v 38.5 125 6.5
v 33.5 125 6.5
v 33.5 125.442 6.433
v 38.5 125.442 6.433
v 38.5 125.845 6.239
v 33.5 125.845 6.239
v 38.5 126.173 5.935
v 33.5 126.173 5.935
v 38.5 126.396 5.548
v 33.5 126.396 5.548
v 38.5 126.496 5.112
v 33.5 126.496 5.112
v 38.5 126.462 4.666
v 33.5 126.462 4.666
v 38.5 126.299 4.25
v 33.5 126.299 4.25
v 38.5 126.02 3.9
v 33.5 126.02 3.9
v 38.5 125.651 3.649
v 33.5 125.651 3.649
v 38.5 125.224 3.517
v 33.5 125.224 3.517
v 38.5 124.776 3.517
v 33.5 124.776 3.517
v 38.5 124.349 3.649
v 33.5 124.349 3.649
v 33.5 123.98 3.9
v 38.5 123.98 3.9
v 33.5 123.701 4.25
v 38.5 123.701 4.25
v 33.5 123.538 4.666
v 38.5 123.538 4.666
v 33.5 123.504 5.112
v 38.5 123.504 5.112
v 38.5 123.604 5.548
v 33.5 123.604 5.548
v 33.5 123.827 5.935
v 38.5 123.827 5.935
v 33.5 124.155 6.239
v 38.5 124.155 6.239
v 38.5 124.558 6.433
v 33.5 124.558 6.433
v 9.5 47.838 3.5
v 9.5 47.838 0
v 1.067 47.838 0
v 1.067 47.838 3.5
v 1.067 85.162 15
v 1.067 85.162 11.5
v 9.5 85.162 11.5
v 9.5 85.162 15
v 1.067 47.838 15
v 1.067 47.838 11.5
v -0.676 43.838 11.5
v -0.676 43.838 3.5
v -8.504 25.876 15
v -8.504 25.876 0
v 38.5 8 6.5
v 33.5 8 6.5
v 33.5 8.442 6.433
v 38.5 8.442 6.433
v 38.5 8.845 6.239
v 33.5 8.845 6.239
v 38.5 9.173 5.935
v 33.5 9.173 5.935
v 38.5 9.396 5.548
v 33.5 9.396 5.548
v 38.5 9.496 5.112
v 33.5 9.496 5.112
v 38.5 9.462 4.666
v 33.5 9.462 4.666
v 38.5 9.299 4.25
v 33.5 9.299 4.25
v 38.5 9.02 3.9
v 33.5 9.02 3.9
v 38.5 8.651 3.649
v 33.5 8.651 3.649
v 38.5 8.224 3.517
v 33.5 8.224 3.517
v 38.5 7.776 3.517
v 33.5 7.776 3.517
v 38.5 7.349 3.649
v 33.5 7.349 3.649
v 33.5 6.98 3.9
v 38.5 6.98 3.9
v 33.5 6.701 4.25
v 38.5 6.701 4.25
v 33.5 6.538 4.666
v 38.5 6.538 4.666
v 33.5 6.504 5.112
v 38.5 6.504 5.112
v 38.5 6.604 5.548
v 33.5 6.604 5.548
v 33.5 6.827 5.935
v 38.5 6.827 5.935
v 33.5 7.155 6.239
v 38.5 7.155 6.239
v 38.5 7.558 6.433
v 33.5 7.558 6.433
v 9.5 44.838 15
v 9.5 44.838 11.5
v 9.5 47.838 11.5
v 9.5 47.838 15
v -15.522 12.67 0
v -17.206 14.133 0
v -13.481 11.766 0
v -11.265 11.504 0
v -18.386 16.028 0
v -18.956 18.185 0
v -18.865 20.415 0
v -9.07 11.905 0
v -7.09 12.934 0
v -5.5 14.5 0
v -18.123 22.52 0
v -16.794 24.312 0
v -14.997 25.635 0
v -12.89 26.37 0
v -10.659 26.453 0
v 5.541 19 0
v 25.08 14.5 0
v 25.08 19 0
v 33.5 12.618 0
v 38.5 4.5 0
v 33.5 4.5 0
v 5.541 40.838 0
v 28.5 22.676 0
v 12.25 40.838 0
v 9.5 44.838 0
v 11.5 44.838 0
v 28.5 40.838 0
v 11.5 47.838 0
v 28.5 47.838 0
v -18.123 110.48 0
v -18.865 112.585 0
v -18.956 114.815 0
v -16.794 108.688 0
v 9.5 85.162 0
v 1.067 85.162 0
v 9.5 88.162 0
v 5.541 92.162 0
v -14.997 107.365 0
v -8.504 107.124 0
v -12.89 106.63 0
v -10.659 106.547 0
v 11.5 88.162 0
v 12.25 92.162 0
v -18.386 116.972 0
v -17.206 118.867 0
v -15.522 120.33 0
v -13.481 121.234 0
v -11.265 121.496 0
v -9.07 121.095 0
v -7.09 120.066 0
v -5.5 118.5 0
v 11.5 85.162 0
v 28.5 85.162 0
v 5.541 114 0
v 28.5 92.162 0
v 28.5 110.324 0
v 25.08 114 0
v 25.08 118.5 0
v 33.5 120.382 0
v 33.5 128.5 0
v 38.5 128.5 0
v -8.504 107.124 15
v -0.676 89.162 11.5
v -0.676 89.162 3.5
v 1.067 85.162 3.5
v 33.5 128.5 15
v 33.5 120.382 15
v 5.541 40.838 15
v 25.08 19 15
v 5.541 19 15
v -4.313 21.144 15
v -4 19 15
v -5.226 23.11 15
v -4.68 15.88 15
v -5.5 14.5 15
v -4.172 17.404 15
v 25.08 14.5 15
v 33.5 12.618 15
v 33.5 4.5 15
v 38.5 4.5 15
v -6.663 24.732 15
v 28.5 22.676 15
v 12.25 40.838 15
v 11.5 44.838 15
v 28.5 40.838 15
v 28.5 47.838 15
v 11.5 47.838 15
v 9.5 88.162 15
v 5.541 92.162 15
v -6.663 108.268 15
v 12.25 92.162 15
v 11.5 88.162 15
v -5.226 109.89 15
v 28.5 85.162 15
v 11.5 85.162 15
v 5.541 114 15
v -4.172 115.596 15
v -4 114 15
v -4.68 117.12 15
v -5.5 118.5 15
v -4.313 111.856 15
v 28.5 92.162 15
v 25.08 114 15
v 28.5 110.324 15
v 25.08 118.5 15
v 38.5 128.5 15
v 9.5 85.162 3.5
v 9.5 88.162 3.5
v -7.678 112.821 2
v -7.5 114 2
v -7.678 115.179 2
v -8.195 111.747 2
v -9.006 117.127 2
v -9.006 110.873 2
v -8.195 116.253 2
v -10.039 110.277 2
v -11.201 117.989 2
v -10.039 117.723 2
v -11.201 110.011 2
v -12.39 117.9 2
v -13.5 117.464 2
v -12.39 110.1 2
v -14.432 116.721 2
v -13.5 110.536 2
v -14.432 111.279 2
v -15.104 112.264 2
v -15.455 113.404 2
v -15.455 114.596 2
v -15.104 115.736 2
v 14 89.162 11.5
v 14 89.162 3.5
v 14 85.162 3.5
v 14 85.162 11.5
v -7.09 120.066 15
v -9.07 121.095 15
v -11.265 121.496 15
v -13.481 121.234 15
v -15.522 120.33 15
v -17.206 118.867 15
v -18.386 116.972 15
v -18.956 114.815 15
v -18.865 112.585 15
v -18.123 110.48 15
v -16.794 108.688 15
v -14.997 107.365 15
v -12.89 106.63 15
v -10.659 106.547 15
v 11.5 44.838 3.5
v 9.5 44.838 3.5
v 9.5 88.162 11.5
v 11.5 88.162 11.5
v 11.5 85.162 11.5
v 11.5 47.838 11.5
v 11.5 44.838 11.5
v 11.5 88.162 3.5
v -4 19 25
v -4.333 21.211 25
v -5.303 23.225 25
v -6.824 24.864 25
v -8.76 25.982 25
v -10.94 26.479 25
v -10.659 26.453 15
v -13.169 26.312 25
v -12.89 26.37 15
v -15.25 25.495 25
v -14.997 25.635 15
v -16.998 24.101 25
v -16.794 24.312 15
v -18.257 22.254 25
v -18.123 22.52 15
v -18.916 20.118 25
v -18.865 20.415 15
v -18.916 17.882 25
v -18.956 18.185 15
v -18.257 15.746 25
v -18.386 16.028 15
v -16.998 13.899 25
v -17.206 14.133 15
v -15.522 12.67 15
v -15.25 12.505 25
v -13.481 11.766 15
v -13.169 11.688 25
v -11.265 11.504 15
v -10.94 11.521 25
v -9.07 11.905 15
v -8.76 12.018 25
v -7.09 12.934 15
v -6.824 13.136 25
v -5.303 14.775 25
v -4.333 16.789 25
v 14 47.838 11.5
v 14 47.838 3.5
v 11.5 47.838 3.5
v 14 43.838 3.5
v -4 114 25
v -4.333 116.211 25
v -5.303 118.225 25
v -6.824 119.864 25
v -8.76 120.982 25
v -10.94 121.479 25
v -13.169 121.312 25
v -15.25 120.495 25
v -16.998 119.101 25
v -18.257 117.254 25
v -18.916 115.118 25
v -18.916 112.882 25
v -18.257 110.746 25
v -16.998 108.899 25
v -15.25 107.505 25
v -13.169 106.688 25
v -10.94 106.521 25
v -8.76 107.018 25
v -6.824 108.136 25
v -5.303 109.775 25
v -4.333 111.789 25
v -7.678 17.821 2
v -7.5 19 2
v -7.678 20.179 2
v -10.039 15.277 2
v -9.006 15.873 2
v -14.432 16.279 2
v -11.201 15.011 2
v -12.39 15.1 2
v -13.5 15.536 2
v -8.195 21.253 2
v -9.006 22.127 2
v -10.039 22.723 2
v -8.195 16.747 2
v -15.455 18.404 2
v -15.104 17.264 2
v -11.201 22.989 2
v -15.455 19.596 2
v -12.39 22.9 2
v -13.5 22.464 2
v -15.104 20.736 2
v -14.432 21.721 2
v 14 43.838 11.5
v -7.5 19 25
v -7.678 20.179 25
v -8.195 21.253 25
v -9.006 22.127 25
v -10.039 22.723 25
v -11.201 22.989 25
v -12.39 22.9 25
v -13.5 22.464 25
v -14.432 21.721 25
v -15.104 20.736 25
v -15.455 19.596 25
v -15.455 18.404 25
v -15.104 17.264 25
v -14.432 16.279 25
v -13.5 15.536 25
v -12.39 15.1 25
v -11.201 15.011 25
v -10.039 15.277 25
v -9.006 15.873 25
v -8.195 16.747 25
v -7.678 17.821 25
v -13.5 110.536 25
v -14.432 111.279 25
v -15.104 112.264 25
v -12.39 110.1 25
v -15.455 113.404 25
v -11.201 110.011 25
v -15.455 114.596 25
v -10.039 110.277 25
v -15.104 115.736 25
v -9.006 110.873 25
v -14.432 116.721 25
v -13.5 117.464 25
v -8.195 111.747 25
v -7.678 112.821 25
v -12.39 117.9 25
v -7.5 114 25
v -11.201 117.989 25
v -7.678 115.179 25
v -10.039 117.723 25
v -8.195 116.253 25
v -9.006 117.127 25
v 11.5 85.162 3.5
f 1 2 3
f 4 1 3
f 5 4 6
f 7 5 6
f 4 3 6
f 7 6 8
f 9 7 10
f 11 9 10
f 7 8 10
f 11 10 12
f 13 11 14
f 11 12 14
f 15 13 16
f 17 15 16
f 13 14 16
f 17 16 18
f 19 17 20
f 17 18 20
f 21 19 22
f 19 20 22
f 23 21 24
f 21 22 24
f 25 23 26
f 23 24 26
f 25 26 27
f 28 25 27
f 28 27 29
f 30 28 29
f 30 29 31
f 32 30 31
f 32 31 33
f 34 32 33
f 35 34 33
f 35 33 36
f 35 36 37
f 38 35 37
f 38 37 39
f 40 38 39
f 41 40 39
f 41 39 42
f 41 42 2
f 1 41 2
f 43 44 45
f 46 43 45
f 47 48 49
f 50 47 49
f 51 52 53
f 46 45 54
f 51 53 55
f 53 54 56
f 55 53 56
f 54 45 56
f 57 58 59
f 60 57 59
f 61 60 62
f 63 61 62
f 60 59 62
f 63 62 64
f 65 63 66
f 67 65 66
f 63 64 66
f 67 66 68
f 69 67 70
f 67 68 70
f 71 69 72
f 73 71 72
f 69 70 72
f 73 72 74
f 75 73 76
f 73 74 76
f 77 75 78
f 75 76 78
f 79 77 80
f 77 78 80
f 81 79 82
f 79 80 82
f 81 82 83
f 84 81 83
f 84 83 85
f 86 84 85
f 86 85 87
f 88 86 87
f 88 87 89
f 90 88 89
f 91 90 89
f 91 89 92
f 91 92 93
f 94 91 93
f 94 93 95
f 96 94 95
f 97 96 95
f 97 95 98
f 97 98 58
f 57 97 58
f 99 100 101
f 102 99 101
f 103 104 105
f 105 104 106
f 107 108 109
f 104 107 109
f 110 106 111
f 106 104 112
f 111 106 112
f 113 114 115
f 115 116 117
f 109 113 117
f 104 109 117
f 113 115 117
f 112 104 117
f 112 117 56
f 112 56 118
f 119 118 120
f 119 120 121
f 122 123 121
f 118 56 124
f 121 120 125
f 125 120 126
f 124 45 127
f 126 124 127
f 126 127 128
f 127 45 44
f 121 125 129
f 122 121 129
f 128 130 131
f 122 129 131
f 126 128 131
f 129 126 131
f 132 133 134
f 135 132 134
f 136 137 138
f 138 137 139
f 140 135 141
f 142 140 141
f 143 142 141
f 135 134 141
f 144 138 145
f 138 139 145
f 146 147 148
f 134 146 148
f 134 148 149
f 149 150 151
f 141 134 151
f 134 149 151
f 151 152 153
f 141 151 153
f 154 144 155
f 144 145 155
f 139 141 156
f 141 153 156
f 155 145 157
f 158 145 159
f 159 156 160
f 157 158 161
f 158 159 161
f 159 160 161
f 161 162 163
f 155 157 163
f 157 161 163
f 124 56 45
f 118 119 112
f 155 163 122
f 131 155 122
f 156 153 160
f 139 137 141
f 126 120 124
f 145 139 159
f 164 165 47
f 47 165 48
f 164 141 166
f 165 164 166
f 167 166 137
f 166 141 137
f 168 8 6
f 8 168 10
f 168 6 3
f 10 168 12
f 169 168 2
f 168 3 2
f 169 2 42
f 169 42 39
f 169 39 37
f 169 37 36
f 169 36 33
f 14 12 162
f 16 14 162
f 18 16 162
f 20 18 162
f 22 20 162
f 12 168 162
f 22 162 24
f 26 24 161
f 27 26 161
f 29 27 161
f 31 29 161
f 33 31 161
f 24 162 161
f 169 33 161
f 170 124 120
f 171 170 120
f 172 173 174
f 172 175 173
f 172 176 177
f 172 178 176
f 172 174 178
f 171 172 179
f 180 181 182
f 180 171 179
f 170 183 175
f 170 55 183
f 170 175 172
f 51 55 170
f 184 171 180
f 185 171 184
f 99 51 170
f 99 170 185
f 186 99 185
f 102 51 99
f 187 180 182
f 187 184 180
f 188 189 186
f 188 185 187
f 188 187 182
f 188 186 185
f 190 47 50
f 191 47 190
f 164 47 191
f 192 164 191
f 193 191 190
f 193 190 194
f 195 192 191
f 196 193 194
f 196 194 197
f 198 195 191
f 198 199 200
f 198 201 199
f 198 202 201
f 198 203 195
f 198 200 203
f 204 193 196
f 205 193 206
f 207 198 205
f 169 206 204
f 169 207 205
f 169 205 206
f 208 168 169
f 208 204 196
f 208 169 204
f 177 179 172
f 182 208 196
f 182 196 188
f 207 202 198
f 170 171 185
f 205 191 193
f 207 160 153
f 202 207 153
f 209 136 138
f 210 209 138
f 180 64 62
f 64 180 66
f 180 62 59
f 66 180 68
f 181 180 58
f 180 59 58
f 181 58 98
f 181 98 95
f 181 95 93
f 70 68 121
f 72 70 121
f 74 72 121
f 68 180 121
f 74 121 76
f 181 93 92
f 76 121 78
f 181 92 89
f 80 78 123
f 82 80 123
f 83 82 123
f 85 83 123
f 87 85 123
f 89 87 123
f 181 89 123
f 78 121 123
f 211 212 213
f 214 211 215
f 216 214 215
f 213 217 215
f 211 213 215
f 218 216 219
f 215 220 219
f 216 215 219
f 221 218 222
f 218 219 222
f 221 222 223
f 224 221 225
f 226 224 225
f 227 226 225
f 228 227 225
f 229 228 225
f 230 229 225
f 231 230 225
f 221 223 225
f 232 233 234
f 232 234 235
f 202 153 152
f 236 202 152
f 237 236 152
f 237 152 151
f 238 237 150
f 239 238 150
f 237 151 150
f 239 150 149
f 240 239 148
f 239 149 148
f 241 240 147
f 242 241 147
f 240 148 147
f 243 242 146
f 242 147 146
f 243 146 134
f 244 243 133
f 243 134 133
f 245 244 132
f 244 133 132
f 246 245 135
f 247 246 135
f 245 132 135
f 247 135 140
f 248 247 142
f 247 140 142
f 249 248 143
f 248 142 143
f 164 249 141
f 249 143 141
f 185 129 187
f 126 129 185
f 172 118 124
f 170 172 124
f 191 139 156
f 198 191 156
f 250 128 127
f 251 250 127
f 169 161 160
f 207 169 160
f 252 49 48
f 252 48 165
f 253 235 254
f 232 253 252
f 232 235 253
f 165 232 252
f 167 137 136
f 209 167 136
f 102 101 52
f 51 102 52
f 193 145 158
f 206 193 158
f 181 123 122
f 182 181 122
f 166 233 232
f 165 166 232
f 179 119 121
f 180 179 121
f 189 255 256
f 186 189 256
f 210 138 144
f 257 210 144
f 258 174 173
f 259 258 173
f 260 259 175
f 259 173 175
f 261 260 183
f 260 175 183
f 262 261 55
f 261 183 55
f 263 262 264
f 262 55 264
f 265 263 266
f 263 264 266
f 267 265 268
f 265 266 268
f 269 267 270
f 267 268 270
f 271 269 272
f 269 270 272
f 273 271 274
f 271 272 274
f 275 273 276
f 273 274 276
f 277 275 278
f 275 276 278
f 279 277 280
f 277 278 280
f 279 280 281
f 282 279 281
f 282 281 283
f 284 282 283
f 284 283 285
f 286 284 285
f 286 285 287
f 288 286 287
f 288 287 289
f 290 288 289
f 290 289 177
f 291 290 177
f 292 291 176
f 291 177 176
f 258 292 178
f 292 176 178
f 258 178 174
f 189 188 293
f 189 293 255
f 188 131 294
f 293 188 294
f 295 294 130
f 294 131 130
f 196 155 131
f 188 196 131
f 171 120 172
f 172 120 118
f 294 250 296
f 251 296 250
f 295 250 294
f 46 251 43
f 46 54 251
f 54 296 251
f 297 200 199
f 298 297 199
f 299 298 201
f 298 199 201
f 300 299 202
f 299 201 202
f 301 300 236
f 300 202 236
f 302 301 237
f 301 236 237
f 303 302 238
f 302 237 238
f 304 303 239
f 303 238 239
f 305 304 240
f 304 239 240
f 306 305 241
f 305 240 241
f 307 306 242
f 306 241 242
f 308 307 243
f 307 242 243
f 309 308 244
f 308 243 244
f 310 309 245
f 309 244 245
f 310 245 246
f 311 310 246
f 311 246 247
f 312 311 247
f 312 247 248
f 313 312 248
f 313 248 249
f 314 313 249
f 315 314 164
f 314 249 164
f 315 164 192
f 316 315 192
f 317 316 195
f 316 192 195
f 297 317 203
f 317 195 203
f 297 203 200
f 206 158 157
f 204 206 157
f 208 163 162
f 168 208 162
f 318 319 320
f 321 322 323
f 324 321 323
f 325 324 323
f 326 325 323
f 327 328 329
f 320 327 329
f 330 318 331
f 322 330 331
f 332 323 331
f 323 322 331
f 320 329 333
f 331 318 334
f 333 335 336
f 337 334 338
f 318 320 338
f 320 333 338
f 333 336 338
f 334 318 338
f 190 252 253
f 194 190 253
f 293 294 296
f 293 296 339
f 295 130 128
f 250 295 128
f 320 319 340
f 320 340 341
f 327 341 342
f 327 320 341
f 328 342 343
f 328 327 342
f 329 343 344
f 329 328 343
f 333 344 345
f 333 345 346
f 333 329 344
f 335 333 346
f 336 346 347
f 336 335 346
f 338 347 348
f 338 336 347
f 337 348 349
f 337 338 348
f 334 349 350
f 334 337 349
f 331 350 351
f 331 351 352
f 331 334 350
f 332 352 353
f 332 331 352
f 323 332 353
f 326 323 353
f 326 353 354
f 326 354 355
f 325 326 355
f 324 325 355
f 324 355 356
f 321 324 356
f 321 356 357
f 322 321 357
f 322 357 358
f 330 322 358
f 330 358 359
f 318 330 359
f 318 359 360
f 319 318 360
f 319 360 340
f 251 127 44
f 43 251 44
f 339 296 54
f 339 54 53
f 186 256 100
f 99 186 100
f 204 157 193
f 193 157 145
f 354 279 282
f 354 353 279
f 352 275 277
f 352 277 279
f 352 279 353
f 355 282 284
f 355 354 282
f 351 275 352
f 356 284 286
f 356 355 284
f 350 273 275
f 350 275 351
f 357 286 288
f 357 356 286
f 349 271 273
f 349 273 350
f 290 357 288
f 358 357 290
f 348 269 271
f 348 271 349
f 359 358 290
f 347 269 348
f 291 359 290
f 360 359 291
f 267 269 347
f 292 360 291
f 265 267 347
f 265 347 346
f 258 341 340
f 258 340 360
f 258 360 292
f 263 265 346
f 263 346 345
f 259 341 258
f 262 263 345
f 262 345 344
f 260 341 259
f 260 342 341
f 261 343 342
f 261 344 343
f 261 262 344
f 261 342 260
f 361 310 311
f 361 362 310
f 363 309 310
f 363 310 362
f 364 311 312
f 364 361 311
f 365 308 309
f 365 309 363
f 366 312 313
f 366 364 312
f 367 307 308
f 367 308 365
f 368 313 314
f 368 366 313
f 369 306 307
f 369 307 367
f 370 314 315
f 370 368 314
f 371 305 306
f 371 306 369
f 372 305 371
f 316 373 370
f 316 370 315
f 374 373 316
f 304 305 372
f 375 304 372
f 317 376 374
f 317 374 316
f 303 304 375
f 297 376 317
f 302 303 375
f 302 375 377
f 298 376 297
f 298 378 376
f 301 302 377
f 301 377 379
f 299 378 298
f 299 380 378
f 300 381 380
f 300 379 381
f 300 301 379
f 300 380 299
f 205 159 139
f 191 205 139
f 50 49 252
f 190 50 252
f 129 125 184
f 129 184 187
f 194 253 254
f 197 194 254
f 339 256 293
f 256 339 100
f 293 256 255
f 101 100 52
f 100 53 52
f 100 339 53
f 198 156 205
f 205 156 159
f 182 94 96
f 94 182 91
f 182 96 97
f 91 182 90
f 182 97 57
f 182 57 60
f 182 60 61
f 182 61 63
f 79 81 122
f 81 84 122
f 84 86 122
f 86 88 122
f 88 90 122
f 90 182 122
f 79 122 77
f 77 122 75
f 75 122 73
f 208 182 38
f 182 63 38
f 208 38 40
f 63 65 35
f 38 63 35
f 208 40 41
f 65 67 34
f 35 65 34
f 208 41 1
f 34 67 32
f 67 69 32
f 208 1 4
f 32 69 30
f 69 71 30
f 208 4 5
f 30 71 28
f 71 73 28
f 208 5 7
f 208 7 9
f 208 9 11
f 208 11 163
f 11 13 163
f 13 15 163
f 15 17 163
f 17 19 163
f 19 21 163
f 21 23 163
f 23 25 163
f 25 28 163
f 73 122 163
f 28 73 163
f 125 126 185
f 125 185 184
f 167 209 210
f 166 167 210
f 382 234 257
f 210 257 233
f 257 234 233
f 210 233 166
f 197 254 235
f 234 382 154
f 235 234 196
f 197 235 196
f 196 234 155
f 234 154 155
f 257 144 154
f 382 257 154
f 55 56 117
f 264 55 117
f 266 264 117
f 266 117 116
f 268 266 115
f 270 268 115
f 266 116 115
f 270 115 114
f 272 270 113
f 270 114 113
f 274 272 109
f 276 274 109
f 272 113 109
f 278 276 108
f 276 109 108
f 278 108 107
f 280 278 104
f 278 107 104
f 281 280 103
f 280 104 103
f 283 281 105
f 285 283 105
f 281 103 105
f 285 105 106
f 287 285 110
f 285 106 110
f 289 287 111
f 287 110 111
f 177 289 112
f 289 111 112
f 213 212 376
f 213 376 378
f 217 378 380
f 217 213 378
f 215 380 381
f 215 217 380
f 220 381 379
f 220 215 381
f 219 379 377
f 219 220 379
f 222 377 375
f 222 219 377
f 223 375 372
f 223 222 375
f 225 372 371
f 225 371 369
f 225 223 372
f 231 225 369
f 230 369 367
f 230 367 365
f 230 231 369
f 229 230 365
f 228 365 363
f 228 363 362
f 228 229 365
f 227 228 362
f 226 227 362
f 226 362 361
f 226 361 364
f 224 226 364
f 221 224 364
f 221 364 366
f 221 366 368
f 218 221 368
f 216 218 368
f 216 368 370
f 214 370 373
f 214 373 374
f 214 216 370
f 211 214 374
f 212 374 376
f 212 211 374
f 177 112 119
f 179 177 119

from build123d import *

# Parameters (mm, degrees)
CROQUIS1_R                 = 4
SALIENTE_EXTRUIR2_DEPTH    = 15
CROQUIS2_R                 = 7.5
CROQUIS2_R_2               = 4
SALIENTE_EXTRUIR3_DEPTH    = 10
CROQUIS3_R                 = 4.006471319
CROQUIS3_R_2               = 4.004031771
SALIENTE_EXTRUIR4_DEPTH    = 2
CROQUIS4_R                 = 1.5
CORTAR_EXTRUIR1_DEPTH      = 6
CROQUIS5_W                 = 8
CROQUIS5_H                 = 4
CORTAR_EXTRUIR2_DEPTH      = 15
CORTAR_EXTRUIR2_DEPTH_BACK = 2.5


with BuildPart() as part:
    # Croquis1 → Saliente-Extruir2 (new body)
    with BuildSketch(Plane.XY):
        with BuildLine():
            Line((28.5, 85.161764706), (28.5, 47.838235294))
            Line((28.5, 47.838235294), (11.5, 47.838235294))
            Line((11.5, 47.838235294), (11.5, 44.838235294))
            Line((11.5, 44.838235294), (9.5, 44.838235294))
            Line((9.5, 44.838235294), (9.5, 47.838235294))
            Line((9.5, 47.838235294), (1.067079587, 47.838235294))
            Line((1.067079587, 47.838235294), (-8.503797206, 25.875519531))
            ThreePointArc((-8.503797206, 25.875519531), (-18.751450015, 17.08519644), (-5.5, 14.5))
            Line((-5.5, 14.5), (25.080237482, 14.5))
            Line((25.080237482, 14.5), (33.5, 12.617754504))
            Line((33.5, 12.617754504), (33.5, 4.5))
            Line((33.5, 4.5), (38.5, 4.5))
            Line((38.5, 4.5), (38.5, 11.5))
            Line((38.5, 11.5), (38.5, 121.5))
            Line((38.5, 121.5), (38.5, 128.5))
            Line((38.5, 128.5), (33.5, 128.5))
            Line((33.5, 128.5), (33.5, 120.382245496))
            Line((33.5, 120.382245496), (25.080237482, 118.5))
            Line((25.080237482, 118.5), (-5.5, 118.5))
            ThreePointArc((-5.5, 118.5), (-18.751450015, 115.91480356), (-8.503797206, 107.124480469))
            Line((-8.503797206, 107.124480469), (1.067079587, 85.161764706))
            Line((1.067079587, 85.161764706), (9.5, 85.161764706))
            Line((9.5, 85.161764706), (9.5, 88.161764706))
            Line((9.5, 88.161764706), (11.5, 88.161764706))
            Line((11.5, 88.161764706), (11.5, 85.161764706))
            Line((11.5, 85.161764706), (28.5, 85.161764706))
        make_face()
        with Locations((-11.5, 114)):
            Circle(CROQUIS1_R, mode=Mode.SUBTRACT)
        with Locations((-11.5, 19)):
            Circle(CROQUIS1_R, mode=Mode.SUBTRACT)
        Polygon((28.5, 22.676470588), (28.5, 40.838235294), (12.25, 40.838235294), align=None, mode=Mode.SUBTRACT)
        Polygon((28.5, 110.323529412), (28.5, 92.161764706), (12.25, 92.161764706), align=None, mode=Mode.SUBTRACT)
        Polygon((25.080237482, 114), (5.540763798, 92.161764706), (5.540763798, 114), align=None, mode=Mode.SUBTRACT)
        Polygon((5.540763798, 40.838235294), (25.080237482, 19), (5.540763798, 19), align=None, mode=Mode.SUBTRACT)
    extrude(amount=SALIENTE_EXTRUIR2_DEPTH)

    # Croquis2 → Saliente-Extruir3 (add)
    with BuildSketch(Plane.XY.offset(15)):
        with Locations((-11.5, 114)):
            Circle(CROQUIS2_R)
        with Locations((-11.5, 114)):
            Circle(CROQUIS2_R_2, mode=Mode.SUBTRACT)
        with Locations((-11.5, 19)):
            Circle(CROQUIS2_R)
        with Locations((-11.5, 19)):
            Circle(CROQUIS2_R_2, mode=Mode.SUBTRACT)
    extrude(amount=SALIENTE_EXTRUIR3_DEPTH)

    # Croquis3 → Saliente-Extruir4 (add)
    with BuildSketch(Plane(origin=(0, 0, 0), x_dir=(-1, 0, 0), z_dir=(0, 0, -1))):
        with Locations((11.5, 114)):
            Circle(CROQUIS3_R)
        with Locations((11.5, 19)):
            Circle(CROQUIS3_R_2)
    extrude(amount=-SALIENTE_EXTRUIR4_DEPTH)

    # Croquis4 → Cortar-Extruir1 (cut, through all)
    with BuildSketch(Plane.ZY.offset(-33.5)):
        with Locations((5, 125)):
            Circle(CROQUIS4_R)
        with Locations((5, 8)):
            Circle(CROQUIS4_R)
    extrude(amount=-CORTAR_EXTRUIR1_DEPTH, mode=Mode.SUBTRACT)

    # Croquis5 → Cortar-Extruir2 (cut, two sides)
    with BuildSketch(Plane.ZY.offset(-11.5)) as cortar_extruir2_sk:
        with Locations((7.5, 87.161764706)):
            Rectangle(CROQUIS5_W, CROQUIS5_H)
        with Locations((7.5, 45.838235294)):
            Rectangle(CROQUIS5_W, CROQUIS5_H)
    extrude(amount=CORTAR_EXTRUIR2_DEPTH, mode=Mode.SUBTRACT)
    extrude(cortar_extruir2_sk.sketch, amount=-CORTAR_EXTRUIR2_DEPTH_BACK, mode=Mode.SUBTRACT)


solid = part.part
